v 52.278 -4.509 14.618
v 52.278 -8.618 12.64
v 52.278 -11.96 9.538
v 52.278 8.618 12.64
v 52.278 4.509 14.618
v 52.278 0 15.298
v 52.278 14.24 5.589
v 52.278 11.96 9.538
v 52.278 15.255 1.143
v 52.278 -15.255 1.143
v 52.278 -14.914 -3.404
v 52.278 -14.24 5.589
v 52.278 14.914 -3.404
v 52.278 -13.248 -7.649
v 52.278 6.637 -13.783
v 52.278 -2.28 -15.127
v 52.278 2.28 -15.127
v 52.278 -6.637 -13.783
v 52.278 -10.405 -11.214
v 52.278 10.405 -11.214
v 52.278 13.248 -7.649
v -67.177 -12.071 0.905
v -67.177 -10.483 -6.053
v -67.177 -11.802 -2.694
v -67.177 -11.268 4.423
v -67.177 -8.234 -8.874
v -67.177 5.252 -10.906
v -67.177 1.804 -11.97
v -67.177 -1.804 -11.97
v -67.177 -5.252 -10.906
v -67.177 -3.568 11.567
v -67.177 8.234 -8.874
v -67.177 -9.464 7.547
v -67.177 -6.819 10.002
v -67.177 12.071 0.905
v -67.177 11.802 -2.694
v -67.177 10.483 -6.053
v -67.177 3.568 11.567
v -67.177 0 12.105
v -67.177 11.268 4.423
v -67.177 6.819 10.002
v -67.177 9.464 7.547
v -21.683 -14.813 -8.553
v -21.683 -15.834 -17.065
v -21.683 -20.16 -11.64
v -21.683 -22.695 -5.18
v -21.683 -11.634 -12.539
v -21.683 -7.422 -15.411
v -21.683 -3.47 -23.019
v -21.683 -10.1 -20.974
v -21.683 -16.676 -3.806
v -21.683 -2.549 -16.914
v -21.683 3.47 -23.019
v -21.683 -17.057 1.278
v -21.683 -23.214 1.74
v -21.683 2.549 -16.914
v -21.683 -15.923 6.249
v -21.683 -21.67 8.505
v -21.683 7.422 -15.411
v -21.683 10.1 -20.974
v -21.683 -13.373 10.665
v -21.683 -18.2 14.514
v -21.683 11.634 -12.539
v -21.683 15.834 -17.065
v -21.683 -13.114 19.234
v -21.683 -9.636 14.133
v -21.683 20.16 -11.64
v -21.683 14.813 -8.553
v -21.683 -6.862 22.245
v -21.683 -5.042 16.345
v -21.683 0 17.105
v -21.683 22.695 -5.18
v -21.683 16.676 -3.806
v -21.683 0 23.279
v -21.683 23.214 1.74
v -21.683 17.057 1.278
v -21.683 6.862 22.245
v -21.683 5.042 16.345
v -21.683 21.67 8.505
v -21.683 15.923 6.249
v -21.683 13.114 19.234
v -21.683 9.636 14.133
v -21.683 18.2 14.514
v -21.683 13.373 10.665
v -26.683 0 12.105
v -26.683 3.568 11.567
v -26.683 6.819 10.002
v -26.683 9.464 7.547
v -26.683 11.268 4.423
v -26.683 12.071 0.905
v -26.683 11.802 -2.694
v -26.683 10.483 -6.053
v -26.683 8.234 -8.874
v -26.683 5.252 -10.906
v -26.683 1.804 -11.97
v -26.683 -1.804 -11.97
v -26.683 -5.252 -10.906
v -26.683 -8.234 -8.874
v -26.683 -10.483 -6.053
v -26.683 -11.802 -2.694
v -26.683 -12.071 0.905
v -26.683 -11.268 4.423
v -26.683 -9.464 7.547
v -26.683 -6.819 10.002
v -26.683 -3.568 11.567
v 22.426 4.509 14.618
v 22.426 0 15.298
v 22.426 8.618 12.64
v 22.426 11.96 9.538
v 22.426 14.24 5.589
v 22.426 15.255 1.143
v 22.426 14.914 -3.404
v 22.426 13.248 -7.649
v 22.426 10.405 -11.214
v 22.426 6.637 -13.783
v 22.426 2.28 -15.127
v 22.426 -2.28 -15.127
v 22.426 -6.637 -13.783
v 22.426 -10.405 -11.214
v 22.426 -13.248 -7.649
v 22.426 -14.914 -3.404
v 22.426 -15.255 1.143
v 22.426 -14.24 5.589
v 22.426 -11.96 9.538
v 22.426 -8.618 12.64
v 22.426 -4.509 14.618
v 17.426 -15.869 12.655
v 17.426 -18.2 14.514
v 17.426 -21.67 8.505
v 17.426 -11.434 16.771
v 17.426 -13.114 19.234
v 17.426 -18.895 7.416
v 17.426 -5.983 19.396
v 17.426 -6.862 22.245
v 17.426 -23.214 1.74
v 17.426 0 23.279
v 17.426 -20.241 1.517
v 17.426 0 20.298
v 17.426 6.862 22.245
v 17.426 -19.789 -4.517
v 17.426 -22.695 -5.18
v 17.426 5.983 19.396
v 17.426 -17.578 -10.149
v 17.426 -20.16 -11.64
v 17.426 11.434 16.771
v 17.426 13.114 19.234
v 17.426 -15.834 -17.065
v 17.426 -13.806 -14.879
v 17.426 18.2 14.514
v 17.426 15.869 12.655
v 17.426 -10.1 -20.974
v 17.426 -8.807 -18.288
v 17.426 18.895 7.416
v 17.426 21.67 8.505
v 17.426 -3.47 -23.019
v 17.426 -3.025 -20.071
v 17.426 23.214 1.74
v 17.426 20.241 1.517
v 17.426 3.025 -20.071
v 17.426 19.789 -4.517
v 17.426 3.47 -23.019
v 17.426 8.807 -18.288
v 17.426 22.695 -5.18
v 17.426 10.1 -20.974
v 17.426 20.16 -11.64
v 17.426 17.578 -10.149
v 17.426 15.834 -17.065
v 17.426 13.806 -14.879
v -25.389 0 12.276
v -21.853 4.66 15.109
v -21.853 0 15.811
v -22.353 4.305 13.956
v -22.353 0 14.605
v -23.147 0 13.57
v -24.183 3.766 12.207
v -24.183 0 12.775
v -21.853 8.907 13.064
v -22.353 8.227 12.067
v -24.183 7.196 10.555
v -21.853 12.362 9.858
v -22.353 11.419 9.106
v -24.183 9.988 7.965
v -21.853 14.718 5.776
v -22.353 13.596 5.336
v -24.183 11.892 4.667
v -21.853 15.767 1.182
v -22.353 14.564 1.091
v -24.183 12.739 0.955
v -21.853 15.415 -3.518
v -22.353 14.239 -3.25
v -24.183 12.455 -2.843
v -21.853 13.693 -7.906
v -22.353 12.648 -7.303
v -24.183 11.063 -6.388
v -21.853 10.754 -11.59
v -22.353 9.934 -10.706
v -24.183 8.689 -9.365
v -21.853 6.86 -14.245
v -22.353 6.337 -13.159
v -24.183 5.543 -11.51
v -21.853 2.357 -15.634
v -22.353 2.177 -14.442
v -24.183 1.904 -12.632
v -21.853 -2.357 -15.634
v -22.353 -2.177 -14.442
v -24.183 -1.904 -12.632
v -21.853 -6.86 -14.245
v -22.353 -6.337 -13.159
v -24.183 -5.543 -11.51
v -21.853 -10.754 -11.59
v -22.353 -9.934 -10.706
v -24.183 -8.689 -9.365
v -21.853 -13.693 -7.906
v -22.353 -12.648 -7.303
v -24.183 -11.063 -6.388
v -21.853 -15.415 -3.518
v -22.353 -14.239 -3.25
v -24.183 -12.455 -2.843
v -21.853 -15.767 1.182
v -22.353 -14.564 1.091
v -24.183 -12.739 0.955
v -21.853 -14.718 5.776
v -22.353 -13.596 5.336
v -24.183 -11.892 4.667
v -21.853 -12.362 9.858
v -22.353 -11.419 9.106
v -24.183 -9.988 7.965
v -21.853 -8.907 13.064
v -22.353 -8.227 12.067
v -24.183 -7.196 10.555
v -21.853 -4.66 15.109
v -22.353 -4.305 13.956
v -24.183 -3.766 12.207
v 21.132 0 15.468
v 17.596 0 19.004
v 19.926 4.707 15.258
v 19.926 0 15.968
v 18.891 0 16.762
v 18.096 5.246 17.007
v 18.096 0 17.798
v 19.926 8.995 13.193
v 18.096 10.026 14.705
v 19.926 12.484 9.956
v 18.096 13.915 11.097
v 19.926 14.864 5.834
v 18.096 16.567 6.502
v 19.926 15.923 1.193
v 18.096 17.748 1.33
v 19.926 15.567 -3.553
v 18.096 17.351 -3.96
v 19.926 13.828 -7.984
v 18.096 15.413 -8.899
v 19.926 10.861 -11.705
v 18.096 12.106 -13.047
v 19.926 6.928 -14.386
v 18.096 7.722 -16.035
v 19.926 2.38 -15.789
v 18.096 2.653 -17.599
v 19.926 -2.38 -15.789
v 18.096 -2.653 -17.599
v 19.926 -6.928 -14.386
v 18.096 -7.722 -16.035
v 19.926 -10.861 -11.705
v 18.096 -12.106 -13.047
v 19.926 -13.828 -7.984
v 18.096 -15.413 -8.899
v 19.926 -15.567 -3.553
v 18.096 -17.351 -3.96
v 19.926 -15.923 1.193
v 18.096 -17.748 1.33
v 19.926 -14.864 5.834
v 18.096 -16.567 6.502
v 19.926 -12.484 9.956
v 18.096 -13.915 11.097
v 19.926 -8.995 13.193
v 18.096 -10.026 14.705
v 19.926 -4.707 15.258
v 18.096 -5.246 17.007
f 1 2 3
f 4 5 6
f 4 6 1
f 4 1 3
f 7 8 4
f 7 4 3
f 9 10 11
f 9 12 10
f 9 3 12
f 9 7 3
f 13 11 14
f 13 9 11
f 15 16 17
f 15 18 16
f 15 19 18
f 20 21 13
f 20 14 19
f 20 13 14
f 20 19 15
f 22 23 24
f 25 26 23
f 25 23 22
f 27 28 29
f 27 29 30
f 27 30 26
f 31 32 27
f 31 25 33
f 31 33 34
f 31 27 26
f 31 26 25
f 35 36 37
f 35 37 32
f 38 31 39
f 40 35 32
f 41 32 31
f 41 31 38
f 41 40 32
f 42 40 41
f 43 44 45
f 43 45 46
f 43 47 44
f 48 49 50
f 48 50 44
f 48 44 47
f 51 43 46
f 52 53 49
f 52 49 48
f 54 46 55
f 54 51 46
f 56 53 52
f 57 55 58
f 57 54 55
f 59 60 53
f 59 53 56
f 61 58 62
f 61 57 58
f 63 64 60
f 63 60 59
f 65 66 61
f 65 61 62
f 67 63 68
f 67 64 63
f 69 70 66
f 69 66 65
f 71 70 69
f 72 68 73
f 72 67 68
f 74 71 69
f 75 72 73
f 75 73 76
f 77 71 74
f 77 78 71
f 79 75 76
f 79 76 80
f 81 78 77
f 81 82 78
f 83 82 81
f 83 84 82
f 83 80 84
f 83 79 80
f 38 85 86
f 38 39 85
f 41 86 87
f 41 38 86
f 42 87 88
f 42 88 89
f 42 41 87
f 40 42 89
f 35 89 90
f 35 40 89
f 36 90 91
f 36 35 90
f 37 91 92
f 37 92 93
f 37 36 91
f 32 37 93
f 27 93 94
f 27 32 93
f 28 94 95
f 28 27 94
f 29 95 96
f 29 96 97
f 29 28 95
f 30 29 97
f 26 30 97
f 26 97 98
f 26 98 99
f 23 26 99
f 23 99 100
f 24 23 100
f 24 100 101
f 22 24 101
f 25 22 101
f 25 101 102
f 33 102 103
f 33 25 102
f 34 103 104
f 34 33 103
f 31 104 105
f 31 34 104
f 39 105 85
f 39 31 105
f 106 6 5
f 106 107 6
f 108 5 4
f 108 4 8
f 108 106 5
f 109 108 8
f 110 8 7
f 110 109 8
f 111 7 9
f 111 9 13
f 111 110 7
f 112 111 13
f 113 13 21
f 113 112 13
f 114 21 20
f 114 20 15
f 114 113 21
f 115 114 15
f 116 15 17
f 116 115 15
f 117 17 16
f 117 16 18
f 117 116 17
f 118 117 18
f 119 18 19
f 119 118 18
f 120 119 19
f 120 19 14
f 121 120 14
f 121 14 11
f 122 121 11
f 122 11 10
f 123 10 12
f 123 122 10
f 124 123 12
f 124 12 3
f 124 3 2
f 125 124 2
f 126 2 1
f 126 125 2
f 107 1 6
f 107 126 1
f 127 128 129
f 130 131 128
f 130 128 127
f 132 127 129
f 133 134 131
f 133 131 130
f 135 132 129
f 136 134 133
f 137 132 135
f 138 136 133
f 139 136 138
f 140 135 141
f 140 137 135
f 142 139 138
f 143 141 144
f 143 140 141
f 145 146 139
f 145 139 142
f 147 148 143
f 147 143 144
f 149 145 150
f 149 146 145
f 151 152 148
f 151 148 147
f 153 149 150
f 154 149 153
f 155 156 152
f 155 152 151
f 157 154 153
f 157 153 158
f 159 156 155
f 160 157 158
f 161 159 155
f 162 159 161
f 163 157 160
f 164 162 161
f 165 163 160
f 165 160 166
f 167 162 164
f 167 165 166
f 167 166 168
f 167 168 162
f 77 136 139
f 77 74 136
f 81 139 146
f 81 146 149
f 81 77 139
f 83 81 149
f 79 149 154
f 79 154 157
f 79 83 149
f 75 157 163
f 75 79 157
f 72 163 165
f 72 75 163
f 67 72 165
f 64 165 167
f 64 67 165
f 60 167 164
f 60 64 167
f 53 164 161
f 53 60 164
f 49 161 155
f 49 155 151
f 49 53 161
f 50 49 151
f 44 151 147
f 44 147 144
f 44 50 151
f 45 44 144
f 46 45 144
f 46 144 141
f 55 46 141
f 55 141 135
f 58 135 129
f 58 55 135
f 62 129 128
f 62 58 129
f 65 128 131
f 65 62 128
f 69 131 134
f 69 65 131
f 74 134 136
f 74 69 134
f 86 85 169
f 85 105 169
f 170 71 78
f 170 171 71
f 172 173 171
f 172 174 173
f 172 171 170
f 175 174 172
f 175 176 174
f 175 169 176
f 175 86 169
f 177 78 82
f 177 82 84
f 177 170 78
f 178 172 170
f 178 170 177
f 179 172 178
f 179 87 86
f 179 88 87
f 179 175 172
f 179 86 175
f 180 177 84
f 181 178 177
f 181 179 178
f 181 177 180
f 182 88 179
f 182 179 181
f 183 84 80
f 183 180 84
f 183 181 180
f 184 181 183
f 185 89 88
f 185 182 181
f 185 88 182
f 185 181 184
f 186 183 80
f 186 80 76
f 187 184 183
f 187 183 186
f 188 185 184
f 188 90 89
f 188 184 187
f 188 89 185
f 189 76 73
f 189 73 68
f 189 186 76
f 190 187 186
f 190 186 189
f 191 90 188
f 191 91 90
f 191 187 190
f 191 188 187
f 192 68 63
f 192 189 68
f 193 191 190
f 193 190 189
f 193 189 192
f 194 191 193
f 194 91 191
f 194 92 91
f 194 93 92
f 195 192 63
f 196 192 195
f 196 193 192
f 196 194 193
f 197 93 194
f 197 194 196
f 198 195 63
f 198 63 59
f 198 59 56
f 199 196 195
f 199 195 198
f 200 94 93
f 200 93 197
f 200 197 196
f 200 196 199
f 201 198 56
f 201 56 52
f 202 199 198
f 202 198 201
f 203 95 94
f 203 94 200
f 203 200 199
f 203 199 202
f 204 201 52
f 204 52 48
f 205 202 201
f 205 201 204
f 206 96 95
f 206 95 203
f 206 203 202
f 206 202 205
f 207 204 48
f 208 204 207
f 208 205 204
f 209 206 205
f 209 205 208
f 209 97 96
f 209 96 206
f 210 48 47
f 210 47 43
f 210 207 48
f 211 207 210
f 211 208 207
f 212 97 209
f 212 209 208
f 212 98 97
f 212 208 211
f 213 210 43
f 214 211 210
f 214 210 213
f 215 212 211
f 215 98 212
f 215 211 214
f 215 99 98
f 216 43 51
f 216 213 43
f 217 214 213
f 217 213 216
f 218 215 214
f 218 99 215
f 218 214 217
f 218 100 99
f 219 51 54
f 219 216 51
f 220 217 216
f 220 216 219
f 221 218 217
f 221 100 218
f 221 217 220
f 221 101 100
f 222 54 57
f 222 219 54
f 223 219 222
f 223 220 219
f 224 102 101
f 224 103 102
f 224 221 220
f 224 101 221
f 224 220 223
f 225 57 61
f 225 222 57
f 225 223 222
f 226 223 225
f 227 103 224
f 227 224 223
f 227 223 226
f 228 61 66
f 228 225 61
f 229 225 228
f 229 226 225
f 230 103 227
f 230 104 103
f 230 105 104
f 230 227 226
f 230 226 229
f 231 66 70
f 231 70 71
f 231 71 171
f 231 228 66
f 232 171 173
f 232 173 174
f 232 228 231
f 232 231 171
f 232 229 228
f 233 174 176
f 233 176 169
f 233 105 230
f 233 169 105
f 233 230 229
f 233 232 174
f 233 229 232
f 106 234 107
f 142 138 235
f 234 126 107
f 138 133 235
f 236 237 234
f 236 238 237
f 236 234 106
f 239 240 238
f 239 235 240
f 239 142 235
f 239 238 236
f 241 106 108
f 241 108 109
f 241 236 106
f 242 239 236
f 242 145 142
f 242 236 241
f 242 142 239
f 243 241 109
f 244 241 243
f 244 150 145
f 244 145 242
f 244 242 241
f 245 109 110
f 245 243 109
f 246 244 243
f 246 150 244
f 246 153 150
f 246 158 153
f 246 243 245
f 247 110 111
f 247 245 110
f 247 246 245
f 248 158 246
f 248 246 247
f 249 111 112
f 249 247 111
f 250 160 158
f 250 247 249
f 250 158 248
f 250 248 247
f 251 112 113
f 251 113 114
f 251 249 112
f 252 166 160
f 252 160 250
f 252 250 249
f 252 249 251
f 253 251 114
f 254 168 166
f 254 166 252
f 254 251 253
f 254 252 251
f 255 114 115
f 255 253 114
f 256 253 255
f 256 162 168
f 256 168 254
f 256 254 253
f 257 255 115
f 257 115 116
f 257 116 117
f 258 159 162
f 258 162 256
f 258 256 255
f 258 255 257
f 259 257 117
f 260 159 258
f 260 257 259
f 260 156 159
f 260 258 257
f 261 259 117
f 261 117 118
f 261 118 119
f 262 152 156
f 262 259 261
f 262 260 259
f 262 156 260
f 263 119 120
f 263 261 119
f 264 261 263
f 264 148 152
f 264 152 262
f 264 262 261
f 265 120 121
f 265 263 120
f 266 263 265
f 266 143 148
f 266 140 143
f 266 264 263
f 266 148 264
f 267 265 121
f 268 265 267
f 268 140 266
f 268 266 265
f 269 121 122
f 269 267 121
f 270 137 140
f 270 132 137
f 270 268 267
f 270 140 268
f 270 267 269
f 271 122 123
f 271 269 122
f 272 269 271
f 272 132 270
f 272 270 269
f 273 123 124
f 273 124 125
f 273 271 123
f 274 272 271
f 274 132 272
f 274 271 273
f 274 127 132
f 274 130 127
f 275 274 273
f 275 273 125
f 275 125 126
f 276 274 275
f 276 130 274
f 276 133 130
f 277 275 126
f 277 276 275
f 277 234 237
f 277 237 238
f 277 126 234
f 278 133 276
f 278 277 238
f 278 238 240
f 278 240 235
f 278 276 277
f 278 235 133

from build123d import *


with BuildPart() as f1:
    # F0 (on Front) → F1 (revolve)
    with BuildSketch(Plane.XZ):
        with BuildLine():
            Line((-67.176946, 0), (0, 0))
            Line((0, 0), (52.278299, 0))
            Line((52.278299, 0), (52.278299, 15.29772))
            Line((52.278299, 15.29772), (22.426098, 15.29772))
            ThreePointArc((22.426098, 15.29772), (18.890564, 16.762186), (17.426098, 20.29772))
            Line((17.426098, 20.29772), (17.426098, 23.27914))
            Line((17.426098, 23.27914), (-21.682857, 23.27914))
            Line((-21.682857, 23.27914), (-21.682857, 17.105153))
            ThreePointArc((-21.682857, 17.105153), (-23.147323, 13.569619), (-26.682857, 12.105153))
            Line((-26.682857, 12.105153), (-67.176946, 12.105153))
            Line((-67.176946, 12.105153), (-67.176946, 0))
        make_face()
    revolve(axis=Axis((-33.588473, 0, 0), (-1, 0, 0)))


solid = f1.part
